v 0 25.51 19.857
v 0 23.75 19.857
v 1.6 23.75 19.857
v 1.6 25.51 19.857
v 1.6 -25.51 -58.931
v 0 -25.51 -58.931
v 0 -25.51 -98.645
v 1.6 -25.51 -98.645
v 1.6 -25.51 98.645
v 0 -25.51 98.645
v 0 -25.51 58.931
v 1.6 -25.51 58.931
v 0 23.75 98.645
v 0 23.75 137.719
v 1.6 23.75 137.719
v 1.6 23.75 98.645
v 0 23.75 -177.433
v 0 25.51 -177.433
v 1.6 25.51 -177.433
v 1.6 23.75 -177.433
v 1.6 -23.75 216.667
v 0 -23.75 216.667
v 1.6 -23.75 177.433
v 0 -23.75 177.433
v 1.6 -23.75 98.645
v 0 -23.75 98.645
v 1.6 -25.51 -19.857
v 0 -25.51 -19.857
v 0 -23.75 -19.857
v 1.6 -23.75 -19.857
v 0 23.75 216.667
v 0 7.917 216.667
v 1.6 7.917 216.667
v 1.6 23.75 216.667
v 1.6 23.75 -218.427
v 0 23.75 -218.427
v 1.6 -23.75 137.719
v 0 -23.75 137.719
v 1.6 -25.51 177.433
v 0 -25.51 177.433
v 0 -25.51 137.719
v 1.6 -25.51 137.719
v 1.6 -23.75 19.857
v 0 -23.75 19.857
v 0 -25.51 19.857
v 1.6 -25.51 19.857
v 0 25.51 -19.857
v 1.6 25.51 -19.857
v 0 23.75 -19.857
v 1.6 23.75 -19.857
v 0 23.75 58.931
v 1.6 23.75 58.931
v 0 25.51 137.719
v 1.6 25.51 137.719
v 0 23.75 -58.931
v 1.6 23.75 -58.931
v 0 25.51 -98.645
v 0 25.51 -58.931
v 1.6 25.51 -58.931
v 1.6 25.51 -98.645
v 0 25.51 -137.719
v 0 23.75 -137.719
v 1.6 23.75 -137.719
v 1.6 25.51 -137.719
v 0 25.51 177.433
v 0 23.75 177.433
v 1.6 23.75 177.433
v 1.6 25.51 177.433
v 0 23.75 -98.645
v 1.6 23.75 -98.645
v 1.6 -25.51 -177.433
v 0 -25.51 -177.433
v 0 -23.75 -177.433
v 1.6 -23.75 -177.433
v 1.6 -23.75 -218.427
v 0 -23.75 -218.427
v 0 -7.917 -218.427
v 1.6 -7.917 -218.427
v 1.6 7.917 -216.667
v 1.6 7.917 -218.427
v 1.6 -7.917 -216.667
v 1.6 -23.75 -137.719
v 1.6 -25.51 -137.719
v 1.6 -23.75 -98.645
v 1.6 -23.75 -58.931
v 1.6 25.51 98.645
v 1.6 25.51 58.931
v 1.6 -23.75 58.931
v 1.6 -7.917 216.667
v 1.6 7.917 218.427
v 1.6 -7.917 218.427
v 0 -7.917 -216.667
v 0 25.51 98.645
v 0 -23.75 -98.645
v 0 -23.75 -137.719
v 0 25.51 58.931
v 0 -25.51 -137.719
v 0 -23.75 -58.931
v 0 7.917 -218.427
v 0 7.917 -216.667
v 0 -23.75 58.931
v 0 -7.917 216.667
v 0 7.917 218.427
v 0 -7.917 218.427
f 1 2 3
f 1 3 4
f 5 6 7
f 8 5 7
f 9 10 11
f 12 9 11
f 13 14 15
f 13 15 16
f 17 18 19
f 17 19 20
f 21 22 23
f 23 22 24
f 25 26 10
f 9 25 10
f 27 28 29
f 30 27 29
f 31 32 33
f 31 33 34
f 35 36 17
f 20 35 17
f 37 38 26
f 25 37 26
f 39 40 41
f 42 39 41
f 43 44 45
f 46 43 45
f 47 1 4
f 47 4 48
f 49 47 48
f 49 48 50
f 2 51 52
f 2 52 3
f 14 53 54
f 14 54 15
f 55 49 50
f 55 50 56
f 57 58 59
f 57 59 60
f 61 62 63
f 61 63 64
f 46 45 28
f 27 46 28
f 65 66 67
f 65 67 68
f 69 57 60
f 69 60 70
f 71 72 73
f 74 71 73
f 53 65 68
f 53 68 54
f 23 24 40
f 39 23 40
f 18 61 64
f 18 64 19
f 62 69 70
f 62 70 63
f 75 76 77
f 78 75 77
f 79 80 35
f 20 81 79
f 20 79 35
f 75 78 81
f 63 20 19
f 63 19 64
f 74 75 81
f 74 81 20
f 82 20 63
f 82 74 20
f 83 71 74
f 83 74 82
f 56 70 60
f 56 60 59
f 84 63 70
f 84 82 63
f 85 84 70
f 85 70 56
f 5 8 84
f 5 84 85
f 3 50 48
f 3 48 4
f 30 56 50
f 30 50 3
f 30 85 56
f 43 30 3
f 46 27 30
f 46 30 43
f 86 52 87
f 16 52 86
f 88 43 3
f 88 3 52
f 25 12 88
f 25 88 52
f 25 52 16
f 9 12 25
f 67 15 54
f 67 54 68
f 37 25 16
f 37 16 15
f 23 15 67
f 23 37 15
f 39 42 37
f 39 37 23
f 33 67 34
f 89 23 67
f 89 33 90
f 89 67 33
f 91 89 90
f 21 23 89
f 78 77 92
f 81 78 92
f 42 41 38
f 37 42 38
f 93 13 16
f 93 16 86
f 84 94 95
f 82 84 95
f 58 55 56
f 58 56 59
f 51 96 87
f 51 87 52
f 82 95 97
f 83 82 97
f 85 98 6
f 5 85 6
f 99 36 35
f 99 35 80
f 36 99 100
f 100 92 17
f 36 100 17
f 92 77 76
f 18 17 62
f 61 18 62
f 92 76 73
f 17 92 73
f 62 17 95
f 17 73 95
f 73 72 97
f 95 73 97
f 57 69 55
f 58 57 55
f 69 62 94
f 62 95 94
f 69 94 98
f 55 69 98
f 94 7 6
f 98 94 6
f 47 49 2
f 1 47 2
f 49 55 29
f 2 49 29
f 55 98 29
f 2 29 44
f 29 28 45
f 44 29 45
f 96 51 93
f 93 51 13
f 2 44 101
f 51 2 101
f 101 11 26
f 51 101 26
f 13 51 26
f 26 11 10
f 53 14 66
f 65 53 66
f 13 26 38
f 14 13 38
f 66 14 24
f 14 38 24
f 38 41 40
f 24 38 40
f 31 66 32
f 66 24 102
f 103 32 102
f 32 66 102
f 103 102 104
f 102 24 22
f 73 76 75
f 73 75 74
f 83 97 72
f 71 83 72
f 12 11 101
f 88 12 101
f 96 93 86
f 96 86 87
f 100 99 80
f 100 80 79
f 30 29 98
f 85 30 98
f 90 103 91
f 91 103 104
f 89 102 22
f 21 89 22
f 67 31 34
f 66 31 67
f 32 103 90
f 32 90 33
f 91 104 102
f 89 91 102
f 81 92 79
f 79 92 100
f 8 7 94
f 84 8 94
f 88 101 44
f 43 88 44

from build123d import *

# Parameters (mm, degrees)
UP_DEPTH = 1.6


with BuildPart() as part:
    # Sketch1 → Up (new body)
    with BuildSketch(Plane(origin=(0, 0, 0), x_dir=(0, 0, -1), z_dir=(1, 0, 0))):
        Polygon((-216.6666645, 23.75), (-177.4327255, 23.75), (-177.4327255, 25.51), (-137.7187865, 25.51), (-137.7187865, 23.75), (-98.6448475, 23.75), (-98.6448475, 25.51), (-58.9309085, 25.51), (-58.9309085, 23.75), (-19.8569695, 23.75), (-19.8569695, 25.51), (19.8569695, 25.51), (19.8569695, 23.75), (58.9309085, 23.75), (58.9309085, 25.51), (98.6448475, 25.51), (98.6448475, 23.75), (137.7187865, 23.75), (137.7187865, 25.51), (177.4327255, 25.51), (177.4327255, 23.75), (216.6666645, 23.75), (218.4266645, 23.75), (218.4266645, 7.916666667), (216.6666645, 7.916666667), (216.6666645, 0), (-216.6666645, 0), (-218.4266645, 0), (-218.4266645, 7.916666667), (-216.6666645, 7.916666667), align=None)
    up = extrude(amount=UP_DEPTH)

    # Mirror2: Up across plane
    add(up.mirror(Plane(origin=(1.6, 0, 216.6666645), x_dir=(0, 0, 1), z_dir=(0, 1, 0))))


solid = part.part
